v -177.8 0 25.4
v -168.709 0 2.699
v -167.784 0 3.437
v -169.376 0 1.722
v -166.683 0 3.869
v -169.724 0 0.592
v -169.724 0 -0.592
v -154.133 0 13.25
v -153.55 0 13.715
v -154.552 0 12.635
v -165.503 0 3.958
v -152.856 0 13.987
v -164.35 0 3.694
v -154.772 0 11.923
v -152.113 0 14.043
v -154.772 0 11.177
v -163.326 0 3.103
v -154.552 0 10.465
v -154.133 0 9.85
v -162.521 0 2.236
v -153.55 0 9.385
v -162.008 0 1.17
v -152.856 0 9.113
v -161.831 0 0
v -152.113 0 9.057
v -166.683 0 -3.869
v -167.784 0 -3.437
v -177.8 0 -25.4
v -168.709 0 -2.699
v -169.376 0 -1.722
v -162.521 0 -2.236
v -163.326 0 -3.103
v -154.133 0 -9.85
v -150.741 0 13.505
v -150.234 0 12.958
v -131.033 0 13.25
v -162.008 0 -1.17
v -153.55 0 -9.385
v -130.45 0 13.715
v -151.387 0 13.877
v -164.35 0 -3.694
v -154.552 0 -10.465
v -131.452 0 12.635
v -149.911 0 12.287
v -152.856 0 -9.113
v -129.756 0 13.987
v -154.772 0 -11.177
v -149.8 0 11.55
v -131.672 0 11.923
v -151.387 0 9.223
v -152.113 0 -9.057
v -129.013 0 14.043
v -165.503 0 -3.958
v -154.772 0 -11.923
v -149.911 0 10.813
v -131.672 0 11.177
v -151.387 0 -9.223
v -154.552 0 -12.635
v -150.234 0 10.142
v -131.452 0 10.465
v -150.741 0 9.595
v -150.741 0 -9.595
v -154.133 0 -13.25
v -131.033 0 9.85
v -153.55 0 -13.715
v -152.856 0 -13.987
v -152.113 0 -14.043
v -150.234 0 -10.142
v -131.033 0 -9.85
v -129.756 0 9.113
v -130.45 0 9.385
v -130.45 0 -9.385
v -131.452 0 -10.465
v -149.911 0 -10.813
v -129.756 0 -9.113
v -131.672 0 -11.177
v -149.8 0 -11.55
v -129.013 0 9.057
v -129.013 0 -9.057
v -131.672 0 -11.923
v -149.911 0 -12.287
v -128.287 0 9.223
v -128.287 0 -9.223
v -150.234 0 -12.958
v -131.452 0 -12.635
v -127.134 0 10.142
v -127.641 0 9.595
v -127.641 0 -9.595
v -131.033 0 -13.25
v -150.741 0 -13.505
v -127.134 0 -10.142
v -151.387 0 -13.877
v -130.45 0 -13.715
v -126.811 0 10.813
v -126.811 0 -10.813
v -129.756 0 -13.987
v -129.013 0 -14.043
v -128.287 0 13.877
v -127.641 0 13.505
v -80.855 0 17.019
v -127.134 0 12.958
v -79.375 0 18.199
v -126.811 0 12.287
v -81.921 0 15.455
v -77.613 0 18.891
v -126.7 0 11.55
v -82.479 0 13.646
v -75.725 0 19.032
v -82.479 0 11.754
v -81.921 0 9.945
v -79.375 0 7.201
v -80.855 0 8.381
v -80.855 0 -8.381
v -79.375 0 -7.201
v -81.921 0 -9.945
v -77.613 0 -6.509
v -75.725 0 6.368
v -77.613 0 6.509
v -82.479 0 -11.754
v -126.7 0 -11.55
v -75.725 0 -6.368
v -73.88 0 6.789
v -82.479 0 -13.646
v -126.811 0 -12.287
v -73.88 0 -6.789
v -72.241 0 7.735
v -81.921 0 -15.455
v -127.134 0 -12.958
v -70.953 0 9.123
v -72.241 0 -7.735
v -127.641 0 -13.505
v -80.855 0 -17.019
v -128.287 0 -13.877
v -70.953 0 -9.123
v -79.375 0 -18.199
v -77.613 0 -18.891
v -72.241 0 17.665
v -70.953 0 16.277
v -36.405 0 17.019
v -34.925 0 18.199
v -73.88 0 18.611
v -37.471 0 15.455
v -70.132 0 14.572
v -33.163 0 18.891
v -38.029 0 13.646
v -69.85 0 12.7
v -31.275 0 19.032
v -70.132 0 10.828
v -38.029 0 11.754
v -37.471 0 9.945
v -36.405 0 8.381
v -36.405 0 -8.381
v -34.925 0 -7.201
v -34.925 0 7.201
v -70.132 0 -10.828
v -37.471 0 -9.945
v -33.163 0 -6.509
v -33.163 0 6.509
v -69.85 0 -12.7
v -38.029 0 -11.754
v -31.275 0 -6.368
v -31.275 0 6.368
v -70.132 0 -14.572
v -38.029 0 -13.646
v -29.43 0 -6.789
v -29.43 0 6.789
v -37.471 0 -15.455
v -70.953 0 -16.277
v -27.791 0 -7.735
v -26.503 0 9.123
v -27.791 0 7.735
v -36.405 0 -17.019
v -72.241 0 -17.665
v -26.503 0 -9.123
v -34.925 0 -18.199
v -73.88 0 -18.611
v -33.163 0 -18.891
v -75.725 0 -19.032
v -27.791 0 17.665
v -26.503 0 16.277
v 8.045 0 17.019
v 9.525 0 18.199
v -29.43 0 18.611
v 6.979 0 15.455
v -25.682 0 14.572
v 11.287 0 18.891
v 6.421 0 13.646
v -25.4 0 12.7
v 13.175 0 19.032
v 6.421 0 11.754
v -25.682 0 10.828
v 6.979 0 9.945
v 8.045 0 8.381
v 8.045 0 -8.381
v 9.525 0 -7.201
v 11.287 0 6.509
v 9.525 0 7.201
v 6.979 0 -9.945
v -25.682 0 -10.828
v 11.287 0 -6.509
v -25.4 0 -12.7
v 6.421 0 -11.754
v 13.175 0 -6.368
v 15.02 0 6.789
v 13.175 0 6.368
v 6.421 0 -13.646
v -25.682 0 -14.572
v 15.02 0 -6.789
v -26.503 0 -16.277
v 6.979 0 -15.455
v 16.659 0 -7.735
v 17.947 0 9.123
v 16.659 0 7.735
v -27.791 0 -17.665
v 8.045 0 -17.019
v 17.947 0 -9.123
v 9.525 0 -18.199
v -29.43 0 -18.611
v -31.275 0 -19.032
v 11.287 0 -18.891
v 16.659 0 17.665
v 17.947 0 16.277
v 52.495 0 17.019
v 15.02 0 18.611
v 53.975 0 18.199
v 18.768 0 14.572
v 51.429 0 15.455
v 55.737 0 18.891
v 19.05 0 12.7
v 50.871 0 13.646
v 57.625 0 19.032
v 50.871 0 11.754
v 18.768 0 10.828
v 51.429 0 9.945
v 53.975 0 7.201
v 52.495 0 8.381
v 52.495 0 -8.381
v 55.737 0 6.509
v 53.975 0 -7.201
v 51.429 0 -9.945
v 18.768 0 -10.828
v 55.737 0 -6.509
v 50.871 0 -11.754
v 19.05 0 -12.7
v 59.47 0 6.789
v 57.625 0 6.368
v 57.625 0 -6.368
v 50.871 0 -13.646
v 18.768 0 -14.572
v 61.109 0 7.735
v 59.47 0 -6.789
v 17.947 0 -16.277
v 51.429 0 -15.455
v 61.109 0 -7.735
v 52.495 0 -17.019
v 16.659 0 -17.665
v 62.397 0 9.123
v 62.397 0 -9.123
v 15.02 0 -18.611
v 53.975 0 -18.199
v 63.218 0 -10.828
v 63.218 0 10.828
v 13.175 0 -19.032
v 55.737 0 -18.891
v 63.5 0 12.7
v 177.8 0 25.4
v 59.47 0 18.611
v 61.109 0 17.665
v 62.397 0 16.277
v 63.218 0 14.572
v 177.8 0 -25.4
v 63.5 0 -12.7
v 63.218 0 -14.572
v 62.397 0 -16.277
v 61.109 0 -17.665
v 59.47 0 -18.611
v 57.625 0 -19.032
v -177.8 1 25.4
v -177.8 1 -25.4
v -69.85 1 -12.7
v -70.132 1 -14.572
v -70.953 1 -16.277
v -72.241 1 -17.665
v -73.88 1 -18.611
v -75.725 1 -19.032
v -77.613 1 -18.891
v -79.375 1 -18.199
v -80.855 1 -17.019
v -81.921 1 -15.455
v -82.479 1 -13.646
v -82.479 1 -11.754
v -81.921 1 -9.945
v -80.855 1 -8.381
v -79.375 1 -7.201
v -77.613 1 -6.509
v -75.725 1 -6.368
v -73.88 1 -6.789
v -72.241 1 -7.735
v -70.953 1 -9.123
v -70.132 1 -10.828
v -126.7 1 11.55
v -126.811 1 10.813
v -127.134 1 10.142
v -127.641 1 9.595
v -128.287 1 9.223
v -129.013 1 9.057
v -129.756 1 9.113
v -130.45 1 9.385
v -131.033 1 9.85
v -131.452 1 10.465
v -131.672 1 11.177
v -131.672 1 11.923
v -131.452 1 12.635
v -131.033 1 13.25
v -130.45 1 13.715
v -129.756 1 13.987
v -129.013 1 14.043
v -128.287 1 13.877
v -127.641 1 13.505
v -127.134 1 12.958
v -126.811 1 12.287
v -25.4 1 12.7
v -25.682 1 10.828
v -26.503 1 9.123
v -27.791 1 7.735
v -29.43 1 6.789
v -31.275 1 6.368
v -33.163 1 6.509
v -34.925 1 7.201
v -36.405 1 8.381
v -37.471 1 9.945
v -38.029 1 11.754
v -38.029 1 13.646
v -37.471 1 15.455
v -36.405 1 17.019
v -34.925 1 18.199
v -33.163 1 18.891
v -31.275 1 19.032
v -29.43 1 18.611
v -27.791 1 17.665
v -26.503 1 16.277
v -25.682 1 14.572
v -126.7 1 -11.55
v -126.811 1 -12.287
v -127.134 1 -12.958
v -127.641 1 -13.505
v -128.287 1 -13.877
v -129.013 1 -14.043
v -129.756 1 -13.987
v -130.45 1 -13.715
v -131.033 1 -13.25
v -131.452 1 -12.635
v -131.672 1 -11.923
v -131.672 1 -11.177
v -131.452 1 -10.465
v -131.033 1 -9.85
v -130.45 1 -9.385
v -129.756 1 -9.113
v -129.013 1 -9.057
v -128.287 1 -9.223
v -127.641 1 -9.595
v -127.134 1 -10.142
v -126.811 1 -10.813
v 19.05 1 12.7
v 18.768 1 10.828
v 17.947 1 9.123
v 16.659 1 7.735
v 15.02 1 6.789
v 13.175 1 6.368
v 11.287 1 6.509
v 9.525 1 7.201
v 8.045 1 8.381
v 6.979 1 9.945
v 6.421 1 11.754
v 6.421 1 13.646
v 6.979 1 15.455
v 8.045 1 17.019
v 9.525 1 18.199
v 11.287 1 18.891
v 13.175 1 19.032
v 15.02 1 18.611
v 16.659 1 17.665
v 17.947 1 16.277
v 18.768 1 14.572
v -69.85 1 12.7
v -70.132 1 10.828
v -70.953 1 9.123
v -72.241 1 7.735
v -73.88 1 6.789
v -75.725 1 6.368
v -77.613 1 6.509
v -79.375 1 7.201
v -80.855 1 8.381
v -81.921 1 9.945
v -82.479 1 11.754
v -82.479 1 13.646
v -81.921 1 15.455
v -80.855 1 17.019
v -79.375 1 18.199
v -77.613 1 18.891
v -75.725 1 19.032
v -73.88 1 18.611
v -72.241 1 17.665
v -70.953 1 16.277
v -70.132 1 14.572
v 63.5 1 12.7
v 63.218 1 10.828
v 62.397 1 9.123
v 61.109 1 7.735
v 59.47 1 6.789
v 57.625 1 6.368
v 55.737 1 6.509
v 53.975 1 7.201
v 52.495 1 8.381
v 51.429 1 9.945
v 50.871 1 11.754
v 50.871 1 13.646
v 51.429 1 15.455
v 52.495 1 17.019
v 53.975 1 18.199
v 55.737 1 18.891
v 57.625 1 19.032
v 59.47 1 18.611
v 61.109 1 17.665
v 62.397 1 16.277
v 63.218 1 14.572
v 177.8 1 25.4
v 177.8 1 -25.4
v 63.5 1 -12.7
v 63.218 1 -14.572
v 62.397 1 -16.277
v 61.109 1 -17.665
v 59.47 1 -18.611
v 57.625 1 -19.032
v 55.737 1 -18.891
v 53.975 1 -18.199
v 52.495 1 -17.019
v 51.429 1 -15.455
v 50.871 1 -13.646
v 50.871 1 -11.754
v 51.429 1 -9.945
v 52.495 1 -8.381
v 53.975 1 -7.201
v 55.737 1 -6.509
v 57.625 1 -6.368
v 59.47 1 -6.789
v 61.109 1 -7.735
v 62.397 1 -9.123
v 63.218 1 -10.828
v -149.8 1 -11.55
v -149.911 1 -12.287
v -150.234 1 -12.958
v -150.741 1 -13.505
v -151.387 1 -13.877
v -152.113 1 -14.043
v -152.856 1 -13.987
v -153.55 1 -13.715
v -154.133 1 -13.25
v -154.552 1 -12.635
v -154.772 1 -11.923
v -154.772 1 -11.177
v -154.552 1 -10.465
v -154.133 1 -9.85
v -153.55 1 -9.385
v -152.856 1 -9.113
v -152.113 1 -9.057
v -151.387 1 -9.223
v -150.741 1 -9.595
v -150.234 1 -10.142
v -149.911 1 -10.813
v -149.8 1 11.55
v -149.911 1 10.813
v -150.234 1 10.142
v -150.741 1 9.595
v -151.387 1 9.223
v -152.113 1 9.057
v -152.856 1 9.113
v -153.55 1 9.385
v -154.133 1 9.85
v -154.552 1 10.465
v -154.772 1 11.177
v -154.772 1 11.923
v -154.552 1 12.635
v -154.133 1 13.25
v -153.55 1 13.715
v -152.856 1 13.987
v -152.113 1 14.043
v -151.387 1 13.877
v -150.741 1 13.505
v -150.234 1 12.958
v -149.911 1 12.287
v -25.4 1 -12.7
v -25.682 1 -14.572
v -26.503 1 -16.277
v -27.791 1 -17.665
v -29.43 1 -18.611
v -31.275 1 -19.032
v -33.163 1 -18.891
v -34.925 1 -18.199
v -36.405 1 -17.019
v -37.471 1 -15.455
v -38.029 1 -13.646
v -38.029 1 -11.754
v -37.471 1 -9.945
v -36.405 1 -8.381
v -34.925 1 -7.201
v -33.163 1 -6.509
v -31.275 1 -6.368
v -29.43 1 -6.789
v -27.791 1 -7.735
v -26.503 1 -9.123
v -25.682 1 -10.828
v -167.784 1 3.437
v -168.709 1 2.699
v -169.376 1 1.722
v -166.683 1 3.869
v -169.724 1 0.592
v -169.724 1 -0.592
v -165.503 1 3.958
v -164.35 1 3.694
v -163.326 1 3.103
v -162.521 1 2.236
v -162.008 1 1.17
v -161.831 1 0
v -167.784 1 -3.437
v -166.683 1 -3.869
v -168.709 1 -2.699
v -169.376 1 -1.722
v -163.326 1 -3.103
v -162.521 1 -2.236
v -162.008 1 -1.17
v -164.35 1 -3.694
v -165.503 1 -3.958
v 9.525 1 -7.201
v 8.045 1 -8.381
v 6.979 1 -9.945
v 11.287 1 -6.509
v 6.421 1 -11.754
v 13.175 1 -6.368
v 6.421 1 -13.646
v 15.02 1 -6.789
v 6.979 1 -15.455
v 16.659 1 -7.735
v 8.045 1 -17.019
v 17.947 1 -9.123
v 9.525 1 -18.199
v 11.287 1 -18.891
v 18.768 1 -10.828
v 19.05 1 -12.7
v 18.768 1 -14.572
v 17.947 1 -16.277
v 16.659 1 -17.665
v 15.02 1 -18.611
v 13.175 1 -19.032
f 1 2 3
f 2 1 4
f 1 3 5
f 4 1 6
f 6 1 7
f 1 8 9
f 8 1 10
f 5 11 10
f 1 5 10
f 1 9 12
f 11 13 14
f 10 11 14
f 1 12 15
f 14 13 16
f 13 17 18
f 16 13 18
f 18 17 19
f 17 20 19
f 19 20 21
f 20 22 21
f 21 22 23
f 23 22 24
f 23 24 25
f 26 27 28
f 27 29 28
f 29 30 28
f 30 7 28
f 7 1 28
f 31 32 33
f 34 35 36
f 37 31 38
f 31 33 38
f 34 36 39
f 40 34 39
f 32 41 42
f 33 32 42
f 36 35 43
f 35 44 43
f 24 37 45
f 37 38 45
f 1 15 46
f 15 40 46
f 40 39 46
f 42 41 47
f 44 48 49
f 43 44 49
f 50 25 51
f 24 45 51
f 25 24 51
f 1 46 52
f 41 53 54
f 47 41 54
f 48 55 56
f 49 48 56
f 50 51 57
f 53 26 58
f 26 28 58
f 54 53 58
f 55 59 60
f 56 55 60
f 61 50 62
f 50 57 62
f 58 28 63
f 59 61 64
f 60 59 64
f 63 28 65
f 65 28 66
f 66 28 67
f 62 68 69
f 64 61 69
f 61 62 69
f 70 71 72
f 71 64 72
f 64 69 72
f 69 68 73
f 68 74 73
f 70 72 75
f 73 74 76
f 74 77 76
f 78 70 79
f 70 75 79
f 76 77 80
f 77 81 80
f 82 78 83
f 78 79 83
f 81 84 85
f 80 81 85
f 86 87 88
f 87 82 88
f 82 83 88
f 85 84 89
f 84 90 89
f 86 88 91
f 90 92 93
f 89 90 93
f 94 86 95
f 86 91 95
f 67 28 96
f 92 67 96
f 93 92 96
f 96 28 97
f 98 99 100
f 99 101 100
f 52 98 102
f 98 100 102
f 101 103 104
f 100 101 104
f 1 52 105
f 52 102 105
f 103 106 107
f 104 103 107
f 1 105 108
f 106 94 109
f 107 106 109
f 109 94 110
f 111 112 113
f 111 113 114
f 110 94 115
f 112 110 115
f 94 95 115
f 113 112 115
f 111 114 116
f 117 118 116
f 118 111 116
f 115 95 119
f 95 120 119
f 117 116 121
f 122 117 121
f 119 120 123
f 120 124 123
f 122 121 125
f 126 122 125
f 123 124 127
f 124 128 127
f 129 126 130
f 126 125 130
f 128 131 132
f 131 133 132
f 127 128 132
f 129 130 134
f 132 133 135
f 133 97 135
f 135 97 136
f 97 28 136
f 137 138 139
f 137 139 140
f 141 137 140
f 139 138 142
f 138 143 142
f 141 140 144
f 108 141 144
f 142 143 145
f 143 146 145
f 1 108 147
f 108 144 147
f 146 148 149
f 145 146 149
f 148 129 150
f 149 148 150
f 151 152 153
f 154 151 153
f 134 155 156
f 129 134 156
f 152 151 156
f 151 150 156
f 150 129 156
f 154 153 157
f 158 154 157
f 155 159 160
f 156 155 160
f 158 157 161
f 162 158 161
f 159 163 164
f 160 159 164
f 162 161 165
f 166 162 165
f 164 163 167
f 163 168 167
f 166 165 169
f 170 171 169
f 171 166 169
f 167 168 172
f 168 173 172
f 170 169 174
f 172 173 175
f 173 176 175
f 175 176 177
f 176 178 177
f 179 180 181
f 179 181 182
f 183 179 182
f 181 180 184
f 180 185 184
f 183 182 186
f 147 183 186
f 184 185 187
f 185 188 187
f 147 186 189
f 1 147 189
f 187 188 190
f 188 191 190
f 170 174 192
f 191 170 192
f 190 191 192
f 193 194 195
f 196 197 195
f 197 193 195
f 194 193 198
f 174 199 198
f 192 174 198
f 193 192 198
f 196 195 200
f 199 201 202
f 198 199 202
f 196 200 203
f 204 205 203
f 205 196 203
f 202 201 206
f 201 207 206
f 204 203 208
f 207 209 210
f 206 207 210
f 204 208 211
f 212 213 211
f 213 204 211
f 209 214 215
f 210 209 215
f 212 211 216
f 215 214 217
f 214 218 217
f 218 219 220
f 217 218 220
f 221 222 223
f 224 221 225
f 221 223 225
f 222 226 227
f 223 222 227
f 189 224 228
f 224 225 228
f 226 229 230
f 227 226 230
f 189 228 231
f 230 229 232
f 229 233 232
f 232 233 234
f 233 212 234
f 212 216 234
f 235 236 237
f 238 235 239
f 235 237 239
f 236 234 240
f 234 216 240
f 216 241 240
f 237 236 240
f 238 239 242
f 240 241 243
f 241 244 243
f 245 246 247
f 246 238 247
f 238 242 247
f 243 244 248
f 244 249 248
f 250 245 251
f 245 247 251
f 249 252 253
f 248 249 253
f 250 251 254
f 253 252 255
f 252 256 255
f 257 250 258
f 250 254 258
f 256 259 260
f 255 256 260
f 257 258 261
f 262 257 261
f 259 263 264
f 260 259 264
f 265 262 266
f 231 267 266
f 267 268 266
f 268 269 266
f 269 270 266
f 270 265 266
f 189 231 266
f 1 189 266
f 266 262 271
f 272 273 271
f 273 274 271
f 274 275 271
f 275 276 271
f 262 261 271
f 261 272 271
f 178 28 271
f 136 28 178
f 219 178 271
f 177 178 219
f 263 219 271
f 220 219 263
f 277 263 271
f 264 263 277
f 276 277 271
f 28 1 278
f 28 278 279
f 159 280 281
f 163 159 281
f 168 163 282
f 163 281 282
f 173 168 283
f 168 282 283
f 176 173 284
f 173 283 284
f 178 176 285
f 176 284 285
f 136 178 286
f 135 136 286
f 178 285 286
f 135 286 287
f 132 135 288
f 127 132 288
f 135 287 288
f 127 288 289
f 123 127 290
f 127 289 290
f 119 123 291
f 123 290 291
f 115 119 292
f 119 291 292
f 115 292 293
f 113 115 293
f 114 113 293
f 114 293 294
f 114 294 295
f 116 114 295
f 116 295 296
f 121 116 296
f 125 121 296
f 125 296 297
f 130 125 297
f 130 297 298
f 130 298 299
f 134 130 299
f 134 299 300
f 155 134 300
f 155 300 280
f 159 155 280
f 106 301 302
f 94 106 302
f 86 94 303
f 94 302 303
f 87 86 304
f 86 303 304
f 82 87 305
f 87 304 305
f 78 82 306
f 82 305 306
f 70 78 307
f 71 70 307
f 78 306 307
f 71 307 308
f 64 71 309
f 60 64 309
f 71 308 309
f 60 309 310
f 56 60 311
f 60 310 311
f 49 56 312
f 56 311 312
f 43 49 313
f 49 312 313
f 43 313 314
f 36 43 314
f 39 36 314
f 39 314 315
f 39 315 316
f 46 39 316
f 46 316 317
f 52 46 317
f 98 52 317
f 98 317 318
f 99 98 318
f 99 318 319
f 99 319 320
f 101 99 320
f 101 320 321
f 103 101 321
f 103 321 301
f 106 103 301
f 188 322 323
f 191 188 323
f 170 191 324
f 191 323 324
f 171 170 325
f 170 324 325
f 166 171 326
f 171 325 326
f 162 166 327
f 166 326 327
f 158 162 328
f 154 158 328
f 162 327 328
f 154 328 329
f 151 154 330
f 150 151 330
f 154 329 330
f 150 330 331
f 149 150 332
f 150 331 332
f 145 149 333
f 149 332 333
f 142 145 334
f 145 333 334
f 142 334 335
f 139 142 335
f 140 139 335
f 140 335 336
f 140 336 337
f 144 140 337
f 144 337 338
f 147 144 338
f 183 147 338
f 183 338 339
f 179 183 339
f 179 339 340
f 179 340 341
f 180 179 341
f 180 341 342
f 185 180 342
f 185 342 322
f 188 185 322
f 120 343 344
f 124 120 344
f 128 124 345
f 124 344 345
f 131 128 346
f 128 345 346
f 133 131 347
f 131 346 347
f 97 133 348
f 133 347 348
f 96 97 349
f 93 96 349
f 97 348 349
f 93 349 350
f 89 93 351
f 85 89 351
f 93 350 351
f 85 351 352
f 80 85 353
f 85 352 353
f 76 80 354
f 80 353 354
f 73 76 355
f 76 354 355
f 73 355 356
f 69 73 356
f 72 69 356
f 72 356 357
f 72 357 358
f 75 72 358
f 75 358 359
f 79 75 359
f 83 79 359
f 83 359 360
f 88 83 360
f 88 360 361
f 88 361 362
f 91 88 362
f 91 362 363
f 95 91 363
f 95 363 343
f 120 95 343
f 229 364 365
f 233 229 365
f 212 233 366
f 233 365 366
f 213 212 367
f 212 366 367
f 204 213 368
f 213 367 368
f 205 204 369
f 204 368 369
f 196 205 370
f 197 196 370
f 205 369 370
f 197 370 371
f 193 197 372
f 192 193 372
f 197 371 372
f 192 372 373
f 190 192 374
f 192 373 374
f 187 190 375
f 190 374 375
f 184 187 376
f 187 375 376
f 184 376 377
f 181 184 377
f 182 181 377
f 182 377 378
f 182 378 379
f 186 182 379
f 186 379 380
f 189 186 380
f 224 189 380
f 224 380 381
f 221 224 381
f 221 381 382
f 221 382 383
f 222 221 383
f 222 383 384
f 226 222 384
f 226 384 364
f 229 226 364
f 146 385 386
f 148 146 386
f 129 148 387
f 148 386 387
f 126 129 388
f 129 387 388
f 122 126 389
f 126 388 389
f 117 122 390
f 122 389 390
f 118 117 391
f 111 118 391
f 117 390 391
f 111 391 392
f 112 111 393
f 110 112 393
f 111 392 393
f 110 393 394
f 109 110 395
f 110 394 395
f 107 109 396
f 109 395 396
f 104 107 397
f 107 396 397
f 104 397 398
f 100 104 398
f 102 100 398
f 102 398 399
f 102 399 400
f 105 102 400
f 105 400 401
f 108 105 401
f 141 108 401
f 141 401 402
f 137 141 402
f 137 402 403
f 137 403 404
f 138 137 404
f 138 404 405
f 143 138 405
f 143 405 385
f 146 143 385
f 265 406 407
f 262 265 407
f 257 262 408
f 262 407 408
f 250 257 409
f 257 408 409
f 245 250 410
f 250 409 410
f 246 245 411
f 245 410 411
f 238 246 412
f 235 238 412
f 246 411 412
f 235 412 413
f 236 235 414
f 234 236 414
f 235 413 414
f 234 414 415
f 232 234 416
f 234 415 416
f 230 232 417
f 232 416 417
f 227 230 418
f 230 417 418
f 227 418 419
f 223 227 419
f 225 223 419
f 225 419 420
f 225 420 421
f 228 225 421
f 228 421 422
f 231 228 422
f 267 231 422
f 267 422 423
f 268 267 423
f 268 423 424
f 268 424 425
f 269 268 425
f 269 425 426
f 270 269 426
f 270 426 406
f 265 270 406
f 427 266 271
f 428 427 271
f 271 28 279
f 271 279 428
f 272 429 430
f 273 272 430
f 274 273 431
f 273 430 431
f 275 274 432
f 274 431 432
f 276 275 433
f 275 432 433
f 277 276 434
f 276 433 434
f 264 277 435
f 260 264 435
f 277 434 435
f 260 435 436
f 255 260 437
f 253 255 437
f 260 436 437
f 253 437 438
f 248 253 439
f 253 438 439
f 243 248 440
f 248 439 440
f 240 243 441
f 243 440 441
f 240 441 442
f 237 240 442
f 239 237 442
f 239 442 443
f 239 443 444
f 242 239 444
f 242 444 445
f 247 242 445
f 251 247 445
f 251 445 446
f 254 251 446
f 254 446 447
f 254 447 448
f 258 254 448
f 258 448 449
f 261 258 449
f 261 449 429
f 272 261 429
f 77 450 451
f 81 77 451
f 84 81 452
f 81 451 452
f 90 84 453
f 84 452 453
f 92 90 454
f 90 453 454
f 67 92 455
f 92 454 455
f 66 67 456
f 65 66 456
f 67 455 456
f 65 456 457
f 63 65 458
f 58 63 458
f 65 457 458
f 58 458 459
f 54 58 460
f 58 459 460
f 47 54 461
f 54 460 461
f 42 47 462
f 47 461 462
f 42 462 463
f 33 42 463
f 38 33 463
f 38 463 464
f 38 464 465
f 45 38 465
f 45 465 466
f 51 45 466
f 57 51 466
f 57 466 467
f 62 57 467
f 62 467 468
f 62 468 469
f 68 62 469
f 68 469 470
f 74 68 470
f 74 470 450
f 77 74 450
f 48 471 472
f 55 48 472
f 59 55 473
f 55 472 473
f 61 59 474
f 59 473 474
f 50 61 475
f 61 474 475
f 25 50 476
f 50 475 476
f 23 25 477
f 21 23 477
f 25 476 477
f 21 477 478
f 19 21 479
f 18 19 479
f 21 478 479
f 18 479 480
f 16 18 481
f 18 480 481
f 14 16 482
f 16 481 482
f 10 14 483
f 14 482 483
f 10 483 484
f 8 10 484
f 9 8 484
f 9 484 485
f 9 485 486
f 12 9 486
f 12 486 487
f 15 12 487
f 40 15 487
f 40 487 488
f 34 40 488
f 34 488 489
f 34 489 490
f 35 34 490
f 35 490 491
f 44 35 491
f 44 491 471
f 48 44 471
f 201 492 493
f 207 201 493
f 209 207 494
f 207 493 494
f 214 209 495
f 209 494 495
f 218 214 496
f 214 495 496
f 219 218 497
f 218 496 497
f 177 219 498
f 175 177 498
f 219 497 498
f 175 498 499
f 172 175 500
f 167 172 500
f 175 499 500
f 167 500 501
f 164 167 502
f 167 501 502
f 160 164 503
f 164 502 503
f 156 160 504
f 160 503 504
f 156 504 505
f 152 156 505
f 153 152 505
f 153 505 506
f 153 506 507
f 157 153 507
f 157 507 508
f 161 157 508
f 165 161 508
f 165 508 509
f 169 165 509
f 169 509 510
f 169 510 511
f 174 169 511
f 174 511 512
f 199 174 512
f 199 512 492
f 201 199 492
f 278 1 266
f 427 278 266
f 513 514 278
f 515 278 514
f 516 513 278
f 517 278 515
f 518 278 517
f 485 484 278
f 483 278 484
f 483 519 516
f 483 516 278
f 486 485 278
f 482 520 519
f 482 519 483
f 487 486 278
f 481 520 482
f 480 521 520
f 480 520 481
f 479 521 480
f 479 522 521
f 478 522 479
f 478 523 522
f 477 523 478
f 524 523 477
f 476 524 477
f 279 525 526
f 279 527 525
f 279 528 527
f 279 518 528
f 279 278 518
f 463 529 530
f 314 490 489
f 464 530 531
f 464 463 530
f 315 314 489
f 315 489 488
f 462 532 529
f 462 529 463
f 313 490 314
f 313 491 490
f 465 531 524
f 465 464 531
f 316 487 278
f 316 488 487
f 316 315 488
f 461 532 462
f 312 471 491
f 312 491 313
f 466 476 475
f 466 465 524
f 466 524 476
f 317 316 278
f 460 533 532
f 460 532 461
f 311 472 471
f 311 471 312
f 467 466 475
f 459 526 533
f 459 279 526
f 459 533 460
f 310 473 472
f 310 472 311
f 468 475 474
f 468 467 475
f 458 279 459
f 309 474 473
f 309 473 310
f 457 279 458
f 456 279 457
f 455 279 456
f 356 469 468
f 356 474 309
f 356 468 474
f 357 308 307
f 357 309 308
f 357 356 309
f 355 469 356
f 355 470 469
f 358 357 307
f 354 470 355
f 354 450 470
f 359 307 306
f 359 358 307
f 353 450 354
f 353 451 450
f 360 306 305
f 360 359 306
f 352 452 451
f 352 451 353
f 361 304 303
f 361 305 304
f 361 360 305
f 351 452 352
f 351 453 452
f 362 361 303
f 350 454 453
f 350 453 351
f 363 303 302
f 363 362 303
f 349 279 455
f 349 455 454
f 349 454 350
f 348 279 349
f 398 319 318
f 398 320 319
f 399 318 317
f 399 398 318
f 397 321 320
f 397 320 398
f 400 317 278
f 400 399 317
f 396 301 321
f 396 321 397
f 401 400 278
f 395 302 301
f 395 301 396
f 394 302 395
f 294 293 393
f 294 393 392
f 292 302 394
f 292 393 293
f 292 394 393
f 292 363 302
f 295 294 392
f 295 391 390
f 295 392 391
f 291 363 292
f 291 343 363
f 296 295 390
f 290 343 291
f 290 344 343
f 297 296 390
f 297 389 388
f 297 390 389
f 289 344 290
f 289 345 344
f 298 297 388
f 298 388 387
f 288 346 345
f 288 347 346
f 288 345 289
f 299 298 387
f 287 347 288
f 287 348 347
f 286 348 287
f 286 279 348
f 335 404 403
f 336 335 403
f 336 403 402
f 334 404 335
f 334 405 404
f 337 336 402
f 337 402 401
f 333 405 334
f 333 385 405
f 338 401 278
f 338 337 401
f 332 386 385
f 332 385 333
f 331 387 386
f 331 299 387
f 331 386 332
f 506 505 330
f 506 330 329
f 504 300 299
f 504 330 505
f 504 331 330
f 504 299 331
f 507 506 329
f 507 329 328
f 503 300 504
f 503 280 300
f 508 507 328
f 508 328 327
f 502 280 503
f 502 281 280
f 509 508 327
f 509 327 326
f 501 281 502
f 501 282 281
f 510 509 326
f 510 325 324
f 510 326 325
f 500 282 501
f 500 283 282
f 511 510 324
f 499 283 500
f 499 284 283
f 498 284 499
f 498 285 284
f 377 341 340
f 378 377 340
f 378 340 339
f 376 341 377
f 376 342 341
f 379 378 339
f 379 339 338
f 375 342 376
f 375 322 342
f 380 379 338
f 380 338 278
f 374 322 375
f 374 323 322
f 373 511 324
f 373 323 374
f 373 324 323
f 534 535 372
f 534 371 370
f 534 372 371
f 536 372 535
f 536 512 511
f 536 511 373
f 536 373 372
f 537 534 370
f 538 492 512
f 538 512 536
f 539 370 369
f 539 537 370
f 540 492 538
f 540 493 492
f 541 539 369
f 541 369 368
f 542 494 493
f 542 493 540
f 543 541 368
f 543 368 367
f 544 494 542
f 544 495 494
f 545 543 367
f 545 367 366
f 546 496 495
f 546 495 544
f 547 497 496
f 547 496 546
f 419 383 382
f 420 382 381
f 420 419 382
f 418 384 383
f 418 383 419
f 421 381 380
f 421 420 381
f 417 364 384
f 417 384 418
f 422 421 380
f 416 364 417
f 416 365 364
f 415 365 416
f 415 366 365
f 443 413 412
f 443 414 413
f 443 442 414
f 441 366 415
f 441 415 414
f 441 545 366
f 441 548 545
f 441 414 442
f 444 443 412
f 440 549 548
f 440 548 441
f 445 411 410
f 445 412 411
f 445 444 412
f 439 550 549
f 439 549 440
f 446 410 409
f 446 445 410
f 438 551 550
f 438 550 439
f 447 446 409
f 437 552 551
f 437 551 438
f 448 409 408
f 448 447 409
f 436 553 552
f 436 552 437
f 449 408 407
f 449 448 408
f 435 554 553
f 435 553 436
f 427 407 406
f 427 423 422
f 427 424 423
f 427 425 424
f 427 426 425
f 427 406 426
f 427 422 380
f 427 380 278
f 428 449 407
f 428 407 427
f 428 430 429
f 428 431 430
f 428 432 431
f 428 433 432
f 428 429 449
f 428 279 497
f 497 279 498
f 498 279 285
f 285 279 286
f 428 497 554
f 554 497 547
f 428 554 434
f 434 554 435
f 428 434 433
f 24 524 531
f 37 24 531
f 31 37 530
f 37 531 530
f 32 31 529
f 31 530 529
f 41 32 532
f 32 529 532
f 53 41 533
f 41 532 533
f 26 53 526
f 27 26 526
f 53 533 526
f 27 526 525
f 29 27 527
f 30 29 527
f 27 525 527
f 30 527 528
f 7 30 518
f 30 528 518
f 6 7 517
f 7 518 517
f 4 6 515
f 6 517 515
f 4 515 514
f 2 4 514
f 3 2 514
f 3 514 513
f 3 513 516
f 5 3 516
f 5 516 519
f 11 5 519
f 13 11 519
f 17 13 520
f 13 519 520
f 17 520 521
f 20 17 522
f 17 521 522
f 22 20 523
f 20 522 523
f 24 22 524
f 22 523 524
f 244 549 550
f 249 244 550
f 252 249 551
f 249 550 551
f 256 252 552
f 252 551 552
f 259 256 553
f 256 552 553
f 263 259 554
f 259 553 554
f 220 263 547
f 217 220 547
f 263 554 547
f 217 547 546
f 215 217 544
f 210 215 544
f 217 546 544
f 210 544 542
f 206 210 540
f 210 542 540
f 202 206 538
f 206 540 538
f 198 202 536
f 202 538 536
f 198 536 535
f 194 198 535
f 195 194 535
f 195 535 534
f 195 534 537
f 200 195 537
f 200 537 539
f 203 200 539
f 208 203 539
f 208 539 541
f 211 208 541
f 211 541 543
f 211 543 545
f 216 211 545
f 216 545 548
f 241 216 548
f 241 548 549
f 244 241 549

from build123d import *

# Parameters (mm, degrees)
ESQUISSE1_W             = 355.6
ESQUISSE1_H             = 50.8
BOSS_EXTRU_1_DEPTH      = 1
ESQUISSE2_R             = 3.96875
ENL_V_MAT_EXTRU_1_DEPTH = 1
ESQUISSE3_R             = 2.5
ENL_V_MAT_EXTRU_2_DEPTH = 2
ESQUISSE4_R             = 6.35
ENL_V_MAT_EXTRU_3_DEPTH = 2


with BuildPart() as part:
    # Esquisse1 → Boss.-Extru.1 (new body)
    with BuildSketch(Plane(origin=(0, 0, 0), x_dir=(1, 0, 0), z_dir=(0, 1, 0))):
        Rectangle(ESQUISSE1_W, ESQUISSE1_H)
    extrude(amount=BOSS_EXTRU_1_DEPTH)

    # Esquisse2 → Enlèv. mat.-Extru.1 (cut)
    with BuildSketch(Plane(origin=(0, 1, 0), x_dir=(1, 0, 0), z_dir=(0, 1, 0))):
        with Locations((-165.8, 0)):
            Circle(ESQUISSE2_R)
    extrude(amount=-ENL_V_MAT_EXTRU_1_DEPTH, mode=Mode.SUBTRACT)

    # Esquisse3 → Enlèv. mat.-Extru.2 (cut)
    with BuildSketch(Plane(origin=(0, 1, 0), x_dir=(1, 0, 0), z_dir=(0, 1, 0))):
        with Locations((-152.3, 11.55)):
            Circle(ESQUISSE3_R)
        with Locations((-129.2, 11.55)):
            Circle(ESQUISSE3_R)
        with Locations((-129.2, -11.55)):
            Circle(ESQUISSE3_R)
        with Locations((-152.3, -11.55)):
            Circle(ESQUISSE3_R)
    extrude(amount=-ENL_V_MAT_EXTRU_2_DEPTH, mode=Mode.SUBTRACT)

    # Esquisse4 → Enlèv. mat.-Extru.3 (cut)
    with BuildSketch(Plane(origin=(0, 1, 0), x_dir=(1, 0, 0), z_dir=(0, 1, 0))):
        with Locations((-76.2, 12.7)):
            Circle(ESQUISSE4_R)
        with Locations((12.7, 12.7)):
            Circle(ESQUISSE4_R)
        with Locations((12.7, -12.7)):
            Circle(ESQUISSE4_R)
        with Locations((-76.2, -12.7)):
            Circle(ESQUISSE4_R)
        with Locations((-31.75, 12.7)):
            Circle(ESQUISSE4_R)
        with Locations((57.15, 12.7)):
            Circle(ESQUISSE4_R)
        with Locations((57.15, -12.7)):
            Circle(ESQUISSE4_R)
        with Locations((-31.75, -12.7)):
            Circle(ESQUISSE4_R)
    extrude(amount=-ENL_V_MAT_EXTRU_3_DEPTH, mode=Mode.SUBTRACT)


solid = part.part
